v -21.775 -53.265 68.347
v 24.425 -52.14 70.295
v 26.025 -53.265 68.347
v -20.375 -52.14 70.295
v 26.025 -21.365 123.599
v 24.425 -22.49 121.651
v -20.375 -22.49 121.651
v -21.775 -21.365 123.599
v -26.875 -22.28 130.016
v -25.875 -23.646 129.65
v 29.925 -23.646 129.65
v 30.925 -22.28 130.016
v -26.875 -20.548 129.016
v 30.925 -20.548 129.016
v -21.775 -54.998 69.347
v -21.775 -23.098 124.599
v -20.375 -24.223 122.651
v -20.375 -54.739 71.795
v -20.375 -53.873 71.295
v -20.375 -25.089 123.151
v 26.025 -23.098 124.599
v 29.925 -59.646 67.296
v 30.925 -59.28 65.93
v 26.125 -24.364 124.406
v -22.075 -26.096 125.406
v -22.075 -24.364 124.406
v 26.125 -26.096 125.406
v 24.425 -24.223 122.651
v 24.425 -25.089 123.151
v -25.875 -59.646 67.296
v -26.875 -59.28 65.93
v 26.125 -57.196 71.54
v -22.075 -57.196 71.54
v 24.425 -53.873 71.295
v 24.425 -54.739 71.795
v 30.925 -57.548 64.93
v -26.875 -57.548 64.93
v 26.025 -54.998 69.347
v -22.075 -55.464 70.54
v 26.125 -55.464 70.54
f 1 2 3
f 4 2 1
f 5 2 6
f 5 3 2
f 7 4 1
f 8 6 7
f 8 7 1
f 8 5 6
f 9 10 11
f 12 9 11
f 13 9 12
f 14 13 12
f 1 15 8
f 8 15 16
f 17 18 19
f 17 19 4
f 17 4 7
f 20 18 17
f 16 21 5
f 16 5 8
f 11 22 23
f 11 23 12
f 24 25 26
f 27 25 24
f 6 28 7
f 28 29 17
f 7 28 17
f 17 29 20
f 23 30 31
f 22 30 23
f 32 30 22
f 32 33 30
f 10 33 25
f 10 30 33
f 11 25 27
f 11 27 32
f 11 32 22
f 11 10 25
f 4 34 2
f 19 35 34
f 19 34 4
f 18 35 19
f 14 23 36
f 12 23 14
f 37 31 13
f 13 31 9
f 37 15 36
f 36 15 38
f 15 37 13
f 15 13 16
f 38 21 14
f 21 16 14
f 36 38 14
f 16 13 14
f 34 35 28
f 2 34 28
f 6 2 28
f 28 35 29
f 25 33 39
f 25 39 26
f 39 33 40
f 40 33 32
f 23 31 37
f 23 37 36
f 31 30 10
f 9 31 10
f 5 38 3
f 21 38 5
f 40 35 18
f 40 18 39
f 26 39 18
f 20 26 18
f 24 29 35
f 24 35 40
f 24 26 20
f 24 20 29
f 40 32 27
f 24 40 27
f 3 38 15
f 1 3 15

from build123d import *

# Parameters (mm, degrees)
SKETCH1_W           = 57.8
SKETCH1_H           = 74
SKETCH1_W_2         = 44.8
SKETCH1_H_2         = 59.3
BOSS_EXTRUDE1_DEPTH = 3
CHAMFER1_SIZE       = 1
SKETCH2_W           = 47.8
SKETCH2_H           = 63.8
SKETCH2_W_2         = 44.8
SKETCH2_H_2         = 59.3
BOSS_EXTRUDE2_DEPTH = 2
SKETCH4_W           = 48.2
SKETCH4_H           = 62.2
CUT_EXTRUDE1_DEPTH  = 2


with BuildPart() as part:
    # Sketch1 → Boss-Extrude1 (new body)
    with BuildSketch(Plane(origin=(0, -73.874274117, 42.651332047), x_dir=(1, 0, 0), z_dir=(0, -0.8660254037844363, 0.5000000000000041))):
        with Locations((2.02457026, 64.457304532)):
            Rectangle(SKETCH1_W, SKETCH1_H)
        with Locations((2.02457026, 64.457304532)):
            Rectangle(SKETCH1_W_2, SKETCH1_H_2, mode=Mode.SUBTRACT)
    extrude(amount=-BOSS_EXTRUDE1_DEPTH)

    # Chamfer1
    chamfer1_edges = [part.edges().sort_by_distance(p)[0] for p in [
        (-20.37542974, -41.645621851, 98.472995232),
        (2.02457026, -56.470621851, 72.795342009),
        (24.42457026, -41.645621851, 98.472995232),
        (2.02457026, -26.820621851, 124.150648454),
        (2.02457026, -23.145621851, 130.515935172),
        (30.92457026, -41.645621851, 98.472995232),
        (2.02457026, -60.145621851, 66.430055292),
        (-26.87542974, -41.645621851, 98.472995232),
    ]]
    chamfer(chamfer1_edges, length=CHAMFER1_SIZE)

    # Sketch2 → Boss-Extrude2 (add)
    with BuildSketch(Plane(origin=(0, -71.276197905, 41.151332047), x_dir=(-1, 0, 0), z_dir=(0, 0.8660254037844366, -0.5000000000000038))):
        with Locations((-2.12457026, 64.457304532)):
            Rectangle(SKETCH2_W, SKETCH2_H)
        with Locations((-2.02457026, 64.457304532)):
            Rectangle(SKETCH2_W_2, SKETCH2_H_2, mode=Mode.SUBTRACT)
    extrude(amount=BOSS_EXTRUDE2_DEPTH)

    # Sketch4 → Cut-Extrude1 (cut)
    with BuildSketch(Plane(origin=(0, -73.874274117, 42.651332047), x_dir=(1, 0, 0), z_dir=(0, -0.8660254037844366, 0.5000000000000038))):
        with Locations((2.02457026, 64.457304532)):
            Rectangle(SKETCH4_W, SKETCH4_H)
    extrude(amount=-CUT_EXTRUDE1_DEPTH, mode=Mode.SUBTRACT)


solid = part.part
